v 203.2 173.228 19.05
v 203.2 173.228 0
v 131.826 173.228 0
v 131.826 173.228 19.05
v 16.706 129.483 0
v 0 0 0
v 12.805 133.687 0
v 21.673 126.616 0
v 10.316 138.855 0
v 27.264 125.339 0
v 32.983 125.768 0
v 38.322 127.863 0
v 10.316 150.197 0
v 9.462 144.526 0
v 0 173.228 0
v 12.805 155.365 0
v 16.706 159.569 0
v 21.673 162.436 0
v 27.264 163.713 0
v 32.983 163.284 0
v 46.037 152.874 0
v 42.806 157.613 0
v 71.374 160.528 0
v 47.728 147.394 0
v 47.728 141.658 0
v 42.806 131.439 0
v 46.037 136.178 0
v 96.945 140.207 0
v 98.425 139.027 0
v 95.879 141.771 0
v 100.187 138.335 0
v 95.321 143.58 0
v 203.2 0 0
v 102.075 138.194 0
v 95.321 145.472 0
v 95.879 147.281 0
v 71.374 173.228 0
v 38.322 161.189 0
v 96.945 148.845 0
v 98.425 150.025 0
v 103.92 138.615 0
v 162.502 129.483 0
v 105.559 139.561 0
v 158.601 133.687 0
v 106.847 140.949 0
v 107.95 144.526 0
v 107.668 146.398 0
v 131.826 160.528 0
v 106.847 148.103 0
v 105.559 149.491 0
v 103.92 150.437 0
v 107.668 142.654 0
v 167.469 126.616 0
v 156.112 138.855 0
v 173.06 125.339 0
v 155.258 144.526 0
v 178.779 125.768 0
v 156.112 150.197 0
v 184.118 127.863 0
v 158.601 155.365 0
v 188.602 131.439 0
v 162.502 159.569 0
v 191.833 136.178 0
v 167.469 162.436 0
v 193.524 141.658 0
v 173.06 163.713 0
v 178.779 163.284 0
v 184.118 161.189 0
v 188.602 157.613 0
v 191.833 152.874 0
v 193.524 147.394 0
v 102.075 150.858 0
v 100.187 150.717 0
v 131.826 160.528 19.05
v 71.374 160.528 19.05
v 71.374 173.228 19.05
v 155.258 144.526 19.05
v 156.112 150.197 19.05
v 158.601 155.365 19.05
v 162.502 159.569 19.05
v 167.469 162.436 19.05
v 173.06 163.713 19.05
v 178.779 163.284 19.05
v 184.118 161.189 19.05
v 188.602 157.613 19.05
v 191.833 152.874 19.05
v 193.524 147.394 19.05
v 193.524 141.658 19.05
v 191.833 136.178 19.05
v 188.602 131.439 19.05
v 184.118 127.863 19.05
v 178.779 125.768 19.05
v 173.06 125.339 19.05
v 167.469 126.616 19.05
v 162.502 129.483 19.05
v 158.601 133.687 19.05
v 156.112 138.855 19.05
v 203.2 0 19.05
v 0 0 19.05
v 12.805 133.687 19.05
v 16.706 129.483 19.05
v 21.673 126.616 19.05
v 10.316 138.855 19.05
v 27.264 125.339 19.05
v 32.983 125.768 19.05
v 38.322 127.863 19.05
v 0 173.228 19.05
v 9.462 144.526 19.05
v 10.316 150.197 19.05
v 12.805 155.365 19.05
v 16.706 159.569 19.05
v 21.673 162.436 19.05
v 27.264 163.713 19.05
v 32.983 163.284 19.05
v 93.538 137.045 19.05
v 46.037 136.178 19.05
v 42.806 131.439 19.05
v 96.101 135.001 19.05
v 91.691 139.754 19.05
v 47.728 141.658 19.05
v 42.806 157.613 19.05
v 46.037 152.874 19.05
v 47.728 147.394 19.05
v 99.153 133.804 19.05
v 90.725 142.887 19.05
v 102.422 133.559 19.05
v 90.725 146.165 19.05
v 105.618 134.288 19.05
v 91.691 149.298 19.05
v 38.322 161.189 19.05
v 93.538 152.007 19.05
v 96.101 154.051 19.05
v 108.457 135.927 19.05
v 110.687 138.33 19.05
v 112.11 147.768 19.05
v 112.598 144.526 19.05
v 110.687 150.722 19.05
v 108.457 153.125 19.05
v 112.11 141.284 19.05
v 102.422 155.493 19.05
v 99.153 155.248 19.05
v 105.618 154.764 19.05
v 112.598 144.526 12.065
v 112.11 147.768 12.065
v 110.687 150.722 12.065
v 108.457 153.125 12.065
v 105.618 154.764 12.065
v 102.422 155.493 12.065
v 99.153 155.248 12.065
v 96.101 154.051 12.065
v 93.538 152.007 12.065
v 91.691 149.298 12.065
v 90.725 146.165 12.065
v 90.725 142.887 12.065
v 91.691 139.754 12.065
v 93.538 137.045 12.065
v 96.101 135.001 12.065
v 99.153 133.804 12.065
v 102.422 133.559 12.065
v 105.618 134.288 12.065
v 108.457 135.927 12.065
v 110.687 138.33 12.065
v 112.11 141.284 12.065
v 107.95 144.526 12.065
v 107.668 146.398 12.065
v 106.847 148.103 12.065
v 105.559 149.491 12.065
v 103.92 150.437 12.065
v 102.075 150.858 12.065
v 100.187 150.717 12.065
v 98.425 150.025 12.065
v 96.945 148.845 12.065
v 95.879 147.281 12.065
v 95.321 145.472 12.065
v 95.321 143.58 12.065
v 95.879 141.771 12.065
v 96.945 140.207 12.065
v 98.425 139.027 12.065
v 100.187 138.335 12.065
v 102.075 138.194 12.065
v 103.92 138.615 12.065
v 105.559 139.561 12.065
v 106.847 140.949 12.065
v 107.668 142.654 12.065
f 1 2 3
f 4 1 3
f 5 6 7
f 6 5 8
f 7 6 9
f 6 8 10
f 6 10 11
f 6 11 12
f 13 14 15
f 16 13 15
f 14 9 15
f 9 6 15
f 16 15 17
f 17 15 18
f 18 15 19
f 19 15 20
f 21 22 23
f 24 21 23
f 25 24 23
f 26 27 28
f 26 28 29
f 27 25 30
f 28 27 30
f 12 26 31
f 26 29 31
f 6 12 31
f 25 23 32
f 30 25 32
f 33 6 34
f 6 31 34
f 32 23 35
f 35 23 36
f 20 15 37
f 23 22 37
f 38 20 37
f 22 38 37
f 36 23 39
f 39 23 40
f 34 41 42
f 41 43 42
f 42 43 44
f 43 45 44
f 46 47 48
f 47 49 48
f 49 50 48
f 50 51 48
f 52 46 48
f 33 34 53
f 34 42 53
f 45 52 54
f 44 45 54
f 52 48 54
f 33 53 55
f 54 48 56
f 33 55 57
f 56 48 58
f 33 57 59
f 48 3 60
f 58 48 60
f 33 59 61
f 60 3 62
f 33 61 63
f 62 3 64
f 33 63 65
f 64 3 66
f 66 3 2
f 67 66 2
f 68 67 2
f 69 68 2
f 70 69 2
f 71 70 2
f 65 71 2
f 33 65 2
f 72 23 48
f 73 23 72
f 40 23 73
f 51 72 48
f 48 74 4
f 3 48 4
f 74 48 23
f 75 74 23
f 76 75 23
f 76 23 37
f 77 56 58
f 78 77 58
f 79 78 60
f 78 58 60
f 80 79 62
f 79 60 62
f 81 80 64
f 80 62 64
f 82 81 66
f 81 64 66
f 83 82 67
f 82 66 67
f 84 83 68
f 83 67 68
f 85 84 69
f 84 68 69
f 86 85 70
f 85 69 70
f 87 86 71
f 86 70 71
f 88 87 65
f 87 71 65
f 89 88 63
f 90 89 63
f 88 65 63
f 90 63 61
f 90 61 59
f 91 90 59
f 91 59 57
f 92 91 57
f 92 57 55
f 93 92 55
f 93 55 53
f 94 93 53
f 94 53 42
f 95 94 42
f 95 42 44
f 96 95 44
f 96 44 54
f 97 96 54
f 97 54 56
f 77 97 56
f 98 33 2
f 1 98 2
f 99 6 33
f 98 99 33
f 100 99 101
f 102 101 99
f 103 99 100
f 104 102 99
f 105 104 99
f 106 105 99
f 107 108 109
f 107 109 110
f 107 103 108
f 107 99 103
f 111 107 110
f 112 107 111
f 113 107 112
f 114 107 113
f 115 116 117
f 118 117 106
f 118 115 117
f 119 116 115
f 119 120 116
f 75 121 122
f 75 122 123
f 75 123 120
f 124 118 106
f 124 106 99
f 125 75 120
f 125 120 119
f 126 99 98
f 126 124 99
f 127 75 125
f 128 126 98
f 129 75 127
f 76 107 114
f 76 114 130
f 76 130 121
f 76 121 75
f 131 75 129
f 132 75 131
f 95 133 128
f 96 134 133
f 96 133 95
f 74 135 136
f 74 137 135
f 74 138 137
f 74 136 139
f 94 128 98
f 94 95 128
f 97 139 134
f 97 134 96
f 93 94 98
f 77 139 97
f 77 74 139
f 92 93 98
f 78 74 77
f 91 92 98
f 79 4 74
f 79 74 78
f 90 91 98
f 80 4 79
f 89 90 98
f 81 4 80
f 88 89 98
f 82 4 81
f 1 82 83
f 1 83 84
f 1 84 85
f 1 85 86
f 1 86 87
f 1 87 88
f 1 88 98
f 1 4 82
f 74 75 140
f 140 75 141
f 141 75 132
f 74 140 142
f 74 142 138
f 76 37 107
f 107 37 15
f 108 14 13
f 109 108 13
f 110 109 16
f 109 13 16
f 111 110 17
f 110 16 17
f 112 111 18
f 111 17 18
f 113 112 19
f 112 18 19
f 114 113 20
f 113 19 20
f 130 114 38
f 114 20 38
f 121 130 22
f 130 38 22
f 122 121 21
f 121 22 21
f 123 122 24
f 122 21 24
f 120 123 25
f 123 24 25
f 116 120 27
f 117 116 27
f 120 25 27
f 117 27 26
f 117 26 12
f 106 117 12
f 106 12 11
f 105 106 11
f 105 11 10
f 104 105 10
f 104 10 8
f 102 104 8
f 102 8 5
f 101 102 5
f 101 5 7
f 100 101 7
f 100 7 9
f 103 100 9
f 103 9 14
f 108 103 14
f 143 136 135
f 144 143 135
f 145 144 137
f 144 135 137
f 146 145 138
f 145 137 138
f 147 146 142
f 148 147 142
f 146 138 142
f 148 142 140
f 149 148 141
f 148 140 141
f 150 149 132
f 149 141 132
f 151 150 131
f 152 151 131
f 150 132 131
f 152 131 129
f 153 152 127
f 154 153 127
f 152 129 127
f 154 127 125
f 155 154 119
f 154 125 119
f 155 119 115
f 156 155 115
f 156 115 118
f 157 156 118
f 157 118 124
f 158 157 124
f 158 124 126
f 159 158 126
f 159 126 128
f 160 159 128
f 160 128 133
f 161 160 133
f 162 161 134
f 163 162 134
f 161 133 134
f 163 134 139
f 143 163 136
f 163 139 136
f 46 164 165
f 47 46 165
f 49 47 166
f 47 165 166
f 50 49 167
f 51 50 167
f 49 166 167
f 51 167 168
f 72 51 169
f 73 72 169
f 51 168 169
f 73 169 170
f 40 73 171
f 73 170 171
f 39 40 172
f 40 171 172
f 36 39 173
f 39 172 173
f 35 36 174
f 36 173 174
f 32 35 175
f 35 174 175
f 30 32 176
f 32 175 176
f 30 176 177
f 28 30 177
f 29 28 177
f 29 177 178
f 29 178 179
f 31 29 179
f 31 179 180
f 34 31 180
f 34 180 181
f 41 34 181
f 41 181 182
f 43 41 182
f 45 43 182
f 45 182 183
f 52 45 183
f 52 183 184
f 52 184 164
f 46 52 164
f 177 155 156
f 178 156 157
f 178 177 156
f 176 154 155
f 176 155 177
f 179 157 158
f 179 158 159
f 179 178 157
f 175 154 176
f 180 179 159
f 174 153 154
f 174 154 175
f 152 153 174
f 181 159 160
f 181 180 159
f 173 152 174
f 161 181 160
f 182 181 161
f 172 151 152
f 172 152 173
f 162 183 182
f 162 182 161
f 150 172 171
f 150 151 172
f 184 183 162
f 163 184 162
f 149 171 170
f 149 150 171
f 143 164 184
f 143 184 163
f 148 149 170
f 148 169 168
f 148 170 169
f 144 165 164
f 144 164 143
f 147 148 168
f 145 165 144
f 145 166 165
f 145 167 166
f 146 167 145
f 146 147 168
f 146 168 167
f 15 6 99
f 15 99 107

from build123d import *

# Parameters (mm, degrees)
SKETCH1_W                = 203.2
SKETCH1_H                = 304.8
BOSS_EXTRUDE1_DEPTH      = 19.05
ESQUISSE2_W              = 203.2
ESQUISSE2_H              = 38.1
ENL_V_MAT_EXTRU_2_DEPTH  = 367.819005097
ESQUISSE3_W              = 203.2
ESQUISSE3_H              = 93.472
ENL_V_MAT_EXTRU_3_DEPTH  = 336.830362683
ESQUISSE5_R              = 19.2405
ENL_V_MAT_EXTRU_5_DEPTH  = 268.695876853
ESQUISSE9_R              = 10.9982
ENL_V_MAT_EXTRU_9_DEPTH  = 6.985
ESQUISSE10_R             = 6.35
ENL_V_MAT_EXTRU_10_DEPTH = 268.289626078
ESQUISSE11_W             = 60.452
ESQUISSE11_H             = 12.7
ENL_V_MAT_EXTRU_11_DEPTH = 19.05


with BuildPart() as part:
    # Sketch1 → Boss-Extrude1 (new body)
    with BuildSketch(Plane.XY):
        with Locations((101.6, 152.4)):
            Rectangle(SKETCH1_W, SKETCH1_H)
    extrude(amount=BOSS_EXTRUDE1_DEPTH)

    # Esquisse2 → Enlèv. mat.-Extru.2 (cut, through all)
    with BuildSketch(Plane(origin=(0, 0, 0), x_dir=(-1, 0, 0), z_dir=(0, 0, -1))):
        with Locations((-101.6, 285.75)):
            Rectangle(ESQUISSE2_W, ESQUISSE2_H)
    extrude(amount=-ENL_V_MAT_EXTRU_2_DEPTH, mode=Mode.SUBTRACT)

    # Esquisse3 → Enlèv. mat.-Extru.3 (cut, through all)
    with BuildSketch(Plane(origin=(0, 0, 0), x_dir=(-1, 0, 0), z_dir=(0, 0, -1))):
        with Locations((-101.6, 219.964)):
            Rectangle(ESQUISSE3_W, ESQUISSE3_H)
    extrude(amount=-ENL_V_MAT_EXTRU_3_DEPTH, mode=Mode.SUBTRACT)

    # Esquisse5 → Enlèv. mat.-Extru.5 (cut, through all)
    with BuildSketch(Plane(origin=(0, 0, 0), x_dir=(-1, 0, 0), z_dir=(0, 0, -1))):
        with Locations((-174.498, 144.526)):
            Circle(ESQUISSE5_R)
        with Locations((-28.702, 144.526)):
            Circle(ESQUISSE5_R)
    extrude(amount=-ENL_V_MAT_EXTRU_5_DEPTH, mode=Mode.SUBTRACT)

    # Esquisse9 → Enlèv. mat.-Extru.9 (cut)
    with BuildSketch(Plane.XY.offset(19.05)):
        with Locations((101.6, 144.526)):
            Circle(ESQUISSE9_R)
    extrude(amount=-ENL_V_MAT_EXTRU_9_DEPTH, mode=Mode.SUBTRACT)

    # Esquisse10 → Enlèv. mat.-Extru.10 (cut, through all)
    with BuildSketch(Plane.XY.offset(12.065)):
        with Locations((101.6, 144.526)):
            Circle(ESQUISSE10_R)
    extrude(amount=-ENL_V_MAT_EXTRU_10_DEPTH, mode=Mode.SUBTRACT)

    # Esquisse11 → Enlèv. mat.-Extru.11 (cut)
    with BuildSketch(Plane(origin=(0, 0, 0), x_dir=(-1, 0, 0), z_dir=(0, 0, -1))):
        with Locations((-101.6, 166.878)):
            Rectangle(ESQUISSE11_W, ESQUISSE11_H)
    extrude(amount=-ENL_V_MAT_EXTRU_11_DEPTH, mode=Mode.SUBTRACT)


solid = part.part
